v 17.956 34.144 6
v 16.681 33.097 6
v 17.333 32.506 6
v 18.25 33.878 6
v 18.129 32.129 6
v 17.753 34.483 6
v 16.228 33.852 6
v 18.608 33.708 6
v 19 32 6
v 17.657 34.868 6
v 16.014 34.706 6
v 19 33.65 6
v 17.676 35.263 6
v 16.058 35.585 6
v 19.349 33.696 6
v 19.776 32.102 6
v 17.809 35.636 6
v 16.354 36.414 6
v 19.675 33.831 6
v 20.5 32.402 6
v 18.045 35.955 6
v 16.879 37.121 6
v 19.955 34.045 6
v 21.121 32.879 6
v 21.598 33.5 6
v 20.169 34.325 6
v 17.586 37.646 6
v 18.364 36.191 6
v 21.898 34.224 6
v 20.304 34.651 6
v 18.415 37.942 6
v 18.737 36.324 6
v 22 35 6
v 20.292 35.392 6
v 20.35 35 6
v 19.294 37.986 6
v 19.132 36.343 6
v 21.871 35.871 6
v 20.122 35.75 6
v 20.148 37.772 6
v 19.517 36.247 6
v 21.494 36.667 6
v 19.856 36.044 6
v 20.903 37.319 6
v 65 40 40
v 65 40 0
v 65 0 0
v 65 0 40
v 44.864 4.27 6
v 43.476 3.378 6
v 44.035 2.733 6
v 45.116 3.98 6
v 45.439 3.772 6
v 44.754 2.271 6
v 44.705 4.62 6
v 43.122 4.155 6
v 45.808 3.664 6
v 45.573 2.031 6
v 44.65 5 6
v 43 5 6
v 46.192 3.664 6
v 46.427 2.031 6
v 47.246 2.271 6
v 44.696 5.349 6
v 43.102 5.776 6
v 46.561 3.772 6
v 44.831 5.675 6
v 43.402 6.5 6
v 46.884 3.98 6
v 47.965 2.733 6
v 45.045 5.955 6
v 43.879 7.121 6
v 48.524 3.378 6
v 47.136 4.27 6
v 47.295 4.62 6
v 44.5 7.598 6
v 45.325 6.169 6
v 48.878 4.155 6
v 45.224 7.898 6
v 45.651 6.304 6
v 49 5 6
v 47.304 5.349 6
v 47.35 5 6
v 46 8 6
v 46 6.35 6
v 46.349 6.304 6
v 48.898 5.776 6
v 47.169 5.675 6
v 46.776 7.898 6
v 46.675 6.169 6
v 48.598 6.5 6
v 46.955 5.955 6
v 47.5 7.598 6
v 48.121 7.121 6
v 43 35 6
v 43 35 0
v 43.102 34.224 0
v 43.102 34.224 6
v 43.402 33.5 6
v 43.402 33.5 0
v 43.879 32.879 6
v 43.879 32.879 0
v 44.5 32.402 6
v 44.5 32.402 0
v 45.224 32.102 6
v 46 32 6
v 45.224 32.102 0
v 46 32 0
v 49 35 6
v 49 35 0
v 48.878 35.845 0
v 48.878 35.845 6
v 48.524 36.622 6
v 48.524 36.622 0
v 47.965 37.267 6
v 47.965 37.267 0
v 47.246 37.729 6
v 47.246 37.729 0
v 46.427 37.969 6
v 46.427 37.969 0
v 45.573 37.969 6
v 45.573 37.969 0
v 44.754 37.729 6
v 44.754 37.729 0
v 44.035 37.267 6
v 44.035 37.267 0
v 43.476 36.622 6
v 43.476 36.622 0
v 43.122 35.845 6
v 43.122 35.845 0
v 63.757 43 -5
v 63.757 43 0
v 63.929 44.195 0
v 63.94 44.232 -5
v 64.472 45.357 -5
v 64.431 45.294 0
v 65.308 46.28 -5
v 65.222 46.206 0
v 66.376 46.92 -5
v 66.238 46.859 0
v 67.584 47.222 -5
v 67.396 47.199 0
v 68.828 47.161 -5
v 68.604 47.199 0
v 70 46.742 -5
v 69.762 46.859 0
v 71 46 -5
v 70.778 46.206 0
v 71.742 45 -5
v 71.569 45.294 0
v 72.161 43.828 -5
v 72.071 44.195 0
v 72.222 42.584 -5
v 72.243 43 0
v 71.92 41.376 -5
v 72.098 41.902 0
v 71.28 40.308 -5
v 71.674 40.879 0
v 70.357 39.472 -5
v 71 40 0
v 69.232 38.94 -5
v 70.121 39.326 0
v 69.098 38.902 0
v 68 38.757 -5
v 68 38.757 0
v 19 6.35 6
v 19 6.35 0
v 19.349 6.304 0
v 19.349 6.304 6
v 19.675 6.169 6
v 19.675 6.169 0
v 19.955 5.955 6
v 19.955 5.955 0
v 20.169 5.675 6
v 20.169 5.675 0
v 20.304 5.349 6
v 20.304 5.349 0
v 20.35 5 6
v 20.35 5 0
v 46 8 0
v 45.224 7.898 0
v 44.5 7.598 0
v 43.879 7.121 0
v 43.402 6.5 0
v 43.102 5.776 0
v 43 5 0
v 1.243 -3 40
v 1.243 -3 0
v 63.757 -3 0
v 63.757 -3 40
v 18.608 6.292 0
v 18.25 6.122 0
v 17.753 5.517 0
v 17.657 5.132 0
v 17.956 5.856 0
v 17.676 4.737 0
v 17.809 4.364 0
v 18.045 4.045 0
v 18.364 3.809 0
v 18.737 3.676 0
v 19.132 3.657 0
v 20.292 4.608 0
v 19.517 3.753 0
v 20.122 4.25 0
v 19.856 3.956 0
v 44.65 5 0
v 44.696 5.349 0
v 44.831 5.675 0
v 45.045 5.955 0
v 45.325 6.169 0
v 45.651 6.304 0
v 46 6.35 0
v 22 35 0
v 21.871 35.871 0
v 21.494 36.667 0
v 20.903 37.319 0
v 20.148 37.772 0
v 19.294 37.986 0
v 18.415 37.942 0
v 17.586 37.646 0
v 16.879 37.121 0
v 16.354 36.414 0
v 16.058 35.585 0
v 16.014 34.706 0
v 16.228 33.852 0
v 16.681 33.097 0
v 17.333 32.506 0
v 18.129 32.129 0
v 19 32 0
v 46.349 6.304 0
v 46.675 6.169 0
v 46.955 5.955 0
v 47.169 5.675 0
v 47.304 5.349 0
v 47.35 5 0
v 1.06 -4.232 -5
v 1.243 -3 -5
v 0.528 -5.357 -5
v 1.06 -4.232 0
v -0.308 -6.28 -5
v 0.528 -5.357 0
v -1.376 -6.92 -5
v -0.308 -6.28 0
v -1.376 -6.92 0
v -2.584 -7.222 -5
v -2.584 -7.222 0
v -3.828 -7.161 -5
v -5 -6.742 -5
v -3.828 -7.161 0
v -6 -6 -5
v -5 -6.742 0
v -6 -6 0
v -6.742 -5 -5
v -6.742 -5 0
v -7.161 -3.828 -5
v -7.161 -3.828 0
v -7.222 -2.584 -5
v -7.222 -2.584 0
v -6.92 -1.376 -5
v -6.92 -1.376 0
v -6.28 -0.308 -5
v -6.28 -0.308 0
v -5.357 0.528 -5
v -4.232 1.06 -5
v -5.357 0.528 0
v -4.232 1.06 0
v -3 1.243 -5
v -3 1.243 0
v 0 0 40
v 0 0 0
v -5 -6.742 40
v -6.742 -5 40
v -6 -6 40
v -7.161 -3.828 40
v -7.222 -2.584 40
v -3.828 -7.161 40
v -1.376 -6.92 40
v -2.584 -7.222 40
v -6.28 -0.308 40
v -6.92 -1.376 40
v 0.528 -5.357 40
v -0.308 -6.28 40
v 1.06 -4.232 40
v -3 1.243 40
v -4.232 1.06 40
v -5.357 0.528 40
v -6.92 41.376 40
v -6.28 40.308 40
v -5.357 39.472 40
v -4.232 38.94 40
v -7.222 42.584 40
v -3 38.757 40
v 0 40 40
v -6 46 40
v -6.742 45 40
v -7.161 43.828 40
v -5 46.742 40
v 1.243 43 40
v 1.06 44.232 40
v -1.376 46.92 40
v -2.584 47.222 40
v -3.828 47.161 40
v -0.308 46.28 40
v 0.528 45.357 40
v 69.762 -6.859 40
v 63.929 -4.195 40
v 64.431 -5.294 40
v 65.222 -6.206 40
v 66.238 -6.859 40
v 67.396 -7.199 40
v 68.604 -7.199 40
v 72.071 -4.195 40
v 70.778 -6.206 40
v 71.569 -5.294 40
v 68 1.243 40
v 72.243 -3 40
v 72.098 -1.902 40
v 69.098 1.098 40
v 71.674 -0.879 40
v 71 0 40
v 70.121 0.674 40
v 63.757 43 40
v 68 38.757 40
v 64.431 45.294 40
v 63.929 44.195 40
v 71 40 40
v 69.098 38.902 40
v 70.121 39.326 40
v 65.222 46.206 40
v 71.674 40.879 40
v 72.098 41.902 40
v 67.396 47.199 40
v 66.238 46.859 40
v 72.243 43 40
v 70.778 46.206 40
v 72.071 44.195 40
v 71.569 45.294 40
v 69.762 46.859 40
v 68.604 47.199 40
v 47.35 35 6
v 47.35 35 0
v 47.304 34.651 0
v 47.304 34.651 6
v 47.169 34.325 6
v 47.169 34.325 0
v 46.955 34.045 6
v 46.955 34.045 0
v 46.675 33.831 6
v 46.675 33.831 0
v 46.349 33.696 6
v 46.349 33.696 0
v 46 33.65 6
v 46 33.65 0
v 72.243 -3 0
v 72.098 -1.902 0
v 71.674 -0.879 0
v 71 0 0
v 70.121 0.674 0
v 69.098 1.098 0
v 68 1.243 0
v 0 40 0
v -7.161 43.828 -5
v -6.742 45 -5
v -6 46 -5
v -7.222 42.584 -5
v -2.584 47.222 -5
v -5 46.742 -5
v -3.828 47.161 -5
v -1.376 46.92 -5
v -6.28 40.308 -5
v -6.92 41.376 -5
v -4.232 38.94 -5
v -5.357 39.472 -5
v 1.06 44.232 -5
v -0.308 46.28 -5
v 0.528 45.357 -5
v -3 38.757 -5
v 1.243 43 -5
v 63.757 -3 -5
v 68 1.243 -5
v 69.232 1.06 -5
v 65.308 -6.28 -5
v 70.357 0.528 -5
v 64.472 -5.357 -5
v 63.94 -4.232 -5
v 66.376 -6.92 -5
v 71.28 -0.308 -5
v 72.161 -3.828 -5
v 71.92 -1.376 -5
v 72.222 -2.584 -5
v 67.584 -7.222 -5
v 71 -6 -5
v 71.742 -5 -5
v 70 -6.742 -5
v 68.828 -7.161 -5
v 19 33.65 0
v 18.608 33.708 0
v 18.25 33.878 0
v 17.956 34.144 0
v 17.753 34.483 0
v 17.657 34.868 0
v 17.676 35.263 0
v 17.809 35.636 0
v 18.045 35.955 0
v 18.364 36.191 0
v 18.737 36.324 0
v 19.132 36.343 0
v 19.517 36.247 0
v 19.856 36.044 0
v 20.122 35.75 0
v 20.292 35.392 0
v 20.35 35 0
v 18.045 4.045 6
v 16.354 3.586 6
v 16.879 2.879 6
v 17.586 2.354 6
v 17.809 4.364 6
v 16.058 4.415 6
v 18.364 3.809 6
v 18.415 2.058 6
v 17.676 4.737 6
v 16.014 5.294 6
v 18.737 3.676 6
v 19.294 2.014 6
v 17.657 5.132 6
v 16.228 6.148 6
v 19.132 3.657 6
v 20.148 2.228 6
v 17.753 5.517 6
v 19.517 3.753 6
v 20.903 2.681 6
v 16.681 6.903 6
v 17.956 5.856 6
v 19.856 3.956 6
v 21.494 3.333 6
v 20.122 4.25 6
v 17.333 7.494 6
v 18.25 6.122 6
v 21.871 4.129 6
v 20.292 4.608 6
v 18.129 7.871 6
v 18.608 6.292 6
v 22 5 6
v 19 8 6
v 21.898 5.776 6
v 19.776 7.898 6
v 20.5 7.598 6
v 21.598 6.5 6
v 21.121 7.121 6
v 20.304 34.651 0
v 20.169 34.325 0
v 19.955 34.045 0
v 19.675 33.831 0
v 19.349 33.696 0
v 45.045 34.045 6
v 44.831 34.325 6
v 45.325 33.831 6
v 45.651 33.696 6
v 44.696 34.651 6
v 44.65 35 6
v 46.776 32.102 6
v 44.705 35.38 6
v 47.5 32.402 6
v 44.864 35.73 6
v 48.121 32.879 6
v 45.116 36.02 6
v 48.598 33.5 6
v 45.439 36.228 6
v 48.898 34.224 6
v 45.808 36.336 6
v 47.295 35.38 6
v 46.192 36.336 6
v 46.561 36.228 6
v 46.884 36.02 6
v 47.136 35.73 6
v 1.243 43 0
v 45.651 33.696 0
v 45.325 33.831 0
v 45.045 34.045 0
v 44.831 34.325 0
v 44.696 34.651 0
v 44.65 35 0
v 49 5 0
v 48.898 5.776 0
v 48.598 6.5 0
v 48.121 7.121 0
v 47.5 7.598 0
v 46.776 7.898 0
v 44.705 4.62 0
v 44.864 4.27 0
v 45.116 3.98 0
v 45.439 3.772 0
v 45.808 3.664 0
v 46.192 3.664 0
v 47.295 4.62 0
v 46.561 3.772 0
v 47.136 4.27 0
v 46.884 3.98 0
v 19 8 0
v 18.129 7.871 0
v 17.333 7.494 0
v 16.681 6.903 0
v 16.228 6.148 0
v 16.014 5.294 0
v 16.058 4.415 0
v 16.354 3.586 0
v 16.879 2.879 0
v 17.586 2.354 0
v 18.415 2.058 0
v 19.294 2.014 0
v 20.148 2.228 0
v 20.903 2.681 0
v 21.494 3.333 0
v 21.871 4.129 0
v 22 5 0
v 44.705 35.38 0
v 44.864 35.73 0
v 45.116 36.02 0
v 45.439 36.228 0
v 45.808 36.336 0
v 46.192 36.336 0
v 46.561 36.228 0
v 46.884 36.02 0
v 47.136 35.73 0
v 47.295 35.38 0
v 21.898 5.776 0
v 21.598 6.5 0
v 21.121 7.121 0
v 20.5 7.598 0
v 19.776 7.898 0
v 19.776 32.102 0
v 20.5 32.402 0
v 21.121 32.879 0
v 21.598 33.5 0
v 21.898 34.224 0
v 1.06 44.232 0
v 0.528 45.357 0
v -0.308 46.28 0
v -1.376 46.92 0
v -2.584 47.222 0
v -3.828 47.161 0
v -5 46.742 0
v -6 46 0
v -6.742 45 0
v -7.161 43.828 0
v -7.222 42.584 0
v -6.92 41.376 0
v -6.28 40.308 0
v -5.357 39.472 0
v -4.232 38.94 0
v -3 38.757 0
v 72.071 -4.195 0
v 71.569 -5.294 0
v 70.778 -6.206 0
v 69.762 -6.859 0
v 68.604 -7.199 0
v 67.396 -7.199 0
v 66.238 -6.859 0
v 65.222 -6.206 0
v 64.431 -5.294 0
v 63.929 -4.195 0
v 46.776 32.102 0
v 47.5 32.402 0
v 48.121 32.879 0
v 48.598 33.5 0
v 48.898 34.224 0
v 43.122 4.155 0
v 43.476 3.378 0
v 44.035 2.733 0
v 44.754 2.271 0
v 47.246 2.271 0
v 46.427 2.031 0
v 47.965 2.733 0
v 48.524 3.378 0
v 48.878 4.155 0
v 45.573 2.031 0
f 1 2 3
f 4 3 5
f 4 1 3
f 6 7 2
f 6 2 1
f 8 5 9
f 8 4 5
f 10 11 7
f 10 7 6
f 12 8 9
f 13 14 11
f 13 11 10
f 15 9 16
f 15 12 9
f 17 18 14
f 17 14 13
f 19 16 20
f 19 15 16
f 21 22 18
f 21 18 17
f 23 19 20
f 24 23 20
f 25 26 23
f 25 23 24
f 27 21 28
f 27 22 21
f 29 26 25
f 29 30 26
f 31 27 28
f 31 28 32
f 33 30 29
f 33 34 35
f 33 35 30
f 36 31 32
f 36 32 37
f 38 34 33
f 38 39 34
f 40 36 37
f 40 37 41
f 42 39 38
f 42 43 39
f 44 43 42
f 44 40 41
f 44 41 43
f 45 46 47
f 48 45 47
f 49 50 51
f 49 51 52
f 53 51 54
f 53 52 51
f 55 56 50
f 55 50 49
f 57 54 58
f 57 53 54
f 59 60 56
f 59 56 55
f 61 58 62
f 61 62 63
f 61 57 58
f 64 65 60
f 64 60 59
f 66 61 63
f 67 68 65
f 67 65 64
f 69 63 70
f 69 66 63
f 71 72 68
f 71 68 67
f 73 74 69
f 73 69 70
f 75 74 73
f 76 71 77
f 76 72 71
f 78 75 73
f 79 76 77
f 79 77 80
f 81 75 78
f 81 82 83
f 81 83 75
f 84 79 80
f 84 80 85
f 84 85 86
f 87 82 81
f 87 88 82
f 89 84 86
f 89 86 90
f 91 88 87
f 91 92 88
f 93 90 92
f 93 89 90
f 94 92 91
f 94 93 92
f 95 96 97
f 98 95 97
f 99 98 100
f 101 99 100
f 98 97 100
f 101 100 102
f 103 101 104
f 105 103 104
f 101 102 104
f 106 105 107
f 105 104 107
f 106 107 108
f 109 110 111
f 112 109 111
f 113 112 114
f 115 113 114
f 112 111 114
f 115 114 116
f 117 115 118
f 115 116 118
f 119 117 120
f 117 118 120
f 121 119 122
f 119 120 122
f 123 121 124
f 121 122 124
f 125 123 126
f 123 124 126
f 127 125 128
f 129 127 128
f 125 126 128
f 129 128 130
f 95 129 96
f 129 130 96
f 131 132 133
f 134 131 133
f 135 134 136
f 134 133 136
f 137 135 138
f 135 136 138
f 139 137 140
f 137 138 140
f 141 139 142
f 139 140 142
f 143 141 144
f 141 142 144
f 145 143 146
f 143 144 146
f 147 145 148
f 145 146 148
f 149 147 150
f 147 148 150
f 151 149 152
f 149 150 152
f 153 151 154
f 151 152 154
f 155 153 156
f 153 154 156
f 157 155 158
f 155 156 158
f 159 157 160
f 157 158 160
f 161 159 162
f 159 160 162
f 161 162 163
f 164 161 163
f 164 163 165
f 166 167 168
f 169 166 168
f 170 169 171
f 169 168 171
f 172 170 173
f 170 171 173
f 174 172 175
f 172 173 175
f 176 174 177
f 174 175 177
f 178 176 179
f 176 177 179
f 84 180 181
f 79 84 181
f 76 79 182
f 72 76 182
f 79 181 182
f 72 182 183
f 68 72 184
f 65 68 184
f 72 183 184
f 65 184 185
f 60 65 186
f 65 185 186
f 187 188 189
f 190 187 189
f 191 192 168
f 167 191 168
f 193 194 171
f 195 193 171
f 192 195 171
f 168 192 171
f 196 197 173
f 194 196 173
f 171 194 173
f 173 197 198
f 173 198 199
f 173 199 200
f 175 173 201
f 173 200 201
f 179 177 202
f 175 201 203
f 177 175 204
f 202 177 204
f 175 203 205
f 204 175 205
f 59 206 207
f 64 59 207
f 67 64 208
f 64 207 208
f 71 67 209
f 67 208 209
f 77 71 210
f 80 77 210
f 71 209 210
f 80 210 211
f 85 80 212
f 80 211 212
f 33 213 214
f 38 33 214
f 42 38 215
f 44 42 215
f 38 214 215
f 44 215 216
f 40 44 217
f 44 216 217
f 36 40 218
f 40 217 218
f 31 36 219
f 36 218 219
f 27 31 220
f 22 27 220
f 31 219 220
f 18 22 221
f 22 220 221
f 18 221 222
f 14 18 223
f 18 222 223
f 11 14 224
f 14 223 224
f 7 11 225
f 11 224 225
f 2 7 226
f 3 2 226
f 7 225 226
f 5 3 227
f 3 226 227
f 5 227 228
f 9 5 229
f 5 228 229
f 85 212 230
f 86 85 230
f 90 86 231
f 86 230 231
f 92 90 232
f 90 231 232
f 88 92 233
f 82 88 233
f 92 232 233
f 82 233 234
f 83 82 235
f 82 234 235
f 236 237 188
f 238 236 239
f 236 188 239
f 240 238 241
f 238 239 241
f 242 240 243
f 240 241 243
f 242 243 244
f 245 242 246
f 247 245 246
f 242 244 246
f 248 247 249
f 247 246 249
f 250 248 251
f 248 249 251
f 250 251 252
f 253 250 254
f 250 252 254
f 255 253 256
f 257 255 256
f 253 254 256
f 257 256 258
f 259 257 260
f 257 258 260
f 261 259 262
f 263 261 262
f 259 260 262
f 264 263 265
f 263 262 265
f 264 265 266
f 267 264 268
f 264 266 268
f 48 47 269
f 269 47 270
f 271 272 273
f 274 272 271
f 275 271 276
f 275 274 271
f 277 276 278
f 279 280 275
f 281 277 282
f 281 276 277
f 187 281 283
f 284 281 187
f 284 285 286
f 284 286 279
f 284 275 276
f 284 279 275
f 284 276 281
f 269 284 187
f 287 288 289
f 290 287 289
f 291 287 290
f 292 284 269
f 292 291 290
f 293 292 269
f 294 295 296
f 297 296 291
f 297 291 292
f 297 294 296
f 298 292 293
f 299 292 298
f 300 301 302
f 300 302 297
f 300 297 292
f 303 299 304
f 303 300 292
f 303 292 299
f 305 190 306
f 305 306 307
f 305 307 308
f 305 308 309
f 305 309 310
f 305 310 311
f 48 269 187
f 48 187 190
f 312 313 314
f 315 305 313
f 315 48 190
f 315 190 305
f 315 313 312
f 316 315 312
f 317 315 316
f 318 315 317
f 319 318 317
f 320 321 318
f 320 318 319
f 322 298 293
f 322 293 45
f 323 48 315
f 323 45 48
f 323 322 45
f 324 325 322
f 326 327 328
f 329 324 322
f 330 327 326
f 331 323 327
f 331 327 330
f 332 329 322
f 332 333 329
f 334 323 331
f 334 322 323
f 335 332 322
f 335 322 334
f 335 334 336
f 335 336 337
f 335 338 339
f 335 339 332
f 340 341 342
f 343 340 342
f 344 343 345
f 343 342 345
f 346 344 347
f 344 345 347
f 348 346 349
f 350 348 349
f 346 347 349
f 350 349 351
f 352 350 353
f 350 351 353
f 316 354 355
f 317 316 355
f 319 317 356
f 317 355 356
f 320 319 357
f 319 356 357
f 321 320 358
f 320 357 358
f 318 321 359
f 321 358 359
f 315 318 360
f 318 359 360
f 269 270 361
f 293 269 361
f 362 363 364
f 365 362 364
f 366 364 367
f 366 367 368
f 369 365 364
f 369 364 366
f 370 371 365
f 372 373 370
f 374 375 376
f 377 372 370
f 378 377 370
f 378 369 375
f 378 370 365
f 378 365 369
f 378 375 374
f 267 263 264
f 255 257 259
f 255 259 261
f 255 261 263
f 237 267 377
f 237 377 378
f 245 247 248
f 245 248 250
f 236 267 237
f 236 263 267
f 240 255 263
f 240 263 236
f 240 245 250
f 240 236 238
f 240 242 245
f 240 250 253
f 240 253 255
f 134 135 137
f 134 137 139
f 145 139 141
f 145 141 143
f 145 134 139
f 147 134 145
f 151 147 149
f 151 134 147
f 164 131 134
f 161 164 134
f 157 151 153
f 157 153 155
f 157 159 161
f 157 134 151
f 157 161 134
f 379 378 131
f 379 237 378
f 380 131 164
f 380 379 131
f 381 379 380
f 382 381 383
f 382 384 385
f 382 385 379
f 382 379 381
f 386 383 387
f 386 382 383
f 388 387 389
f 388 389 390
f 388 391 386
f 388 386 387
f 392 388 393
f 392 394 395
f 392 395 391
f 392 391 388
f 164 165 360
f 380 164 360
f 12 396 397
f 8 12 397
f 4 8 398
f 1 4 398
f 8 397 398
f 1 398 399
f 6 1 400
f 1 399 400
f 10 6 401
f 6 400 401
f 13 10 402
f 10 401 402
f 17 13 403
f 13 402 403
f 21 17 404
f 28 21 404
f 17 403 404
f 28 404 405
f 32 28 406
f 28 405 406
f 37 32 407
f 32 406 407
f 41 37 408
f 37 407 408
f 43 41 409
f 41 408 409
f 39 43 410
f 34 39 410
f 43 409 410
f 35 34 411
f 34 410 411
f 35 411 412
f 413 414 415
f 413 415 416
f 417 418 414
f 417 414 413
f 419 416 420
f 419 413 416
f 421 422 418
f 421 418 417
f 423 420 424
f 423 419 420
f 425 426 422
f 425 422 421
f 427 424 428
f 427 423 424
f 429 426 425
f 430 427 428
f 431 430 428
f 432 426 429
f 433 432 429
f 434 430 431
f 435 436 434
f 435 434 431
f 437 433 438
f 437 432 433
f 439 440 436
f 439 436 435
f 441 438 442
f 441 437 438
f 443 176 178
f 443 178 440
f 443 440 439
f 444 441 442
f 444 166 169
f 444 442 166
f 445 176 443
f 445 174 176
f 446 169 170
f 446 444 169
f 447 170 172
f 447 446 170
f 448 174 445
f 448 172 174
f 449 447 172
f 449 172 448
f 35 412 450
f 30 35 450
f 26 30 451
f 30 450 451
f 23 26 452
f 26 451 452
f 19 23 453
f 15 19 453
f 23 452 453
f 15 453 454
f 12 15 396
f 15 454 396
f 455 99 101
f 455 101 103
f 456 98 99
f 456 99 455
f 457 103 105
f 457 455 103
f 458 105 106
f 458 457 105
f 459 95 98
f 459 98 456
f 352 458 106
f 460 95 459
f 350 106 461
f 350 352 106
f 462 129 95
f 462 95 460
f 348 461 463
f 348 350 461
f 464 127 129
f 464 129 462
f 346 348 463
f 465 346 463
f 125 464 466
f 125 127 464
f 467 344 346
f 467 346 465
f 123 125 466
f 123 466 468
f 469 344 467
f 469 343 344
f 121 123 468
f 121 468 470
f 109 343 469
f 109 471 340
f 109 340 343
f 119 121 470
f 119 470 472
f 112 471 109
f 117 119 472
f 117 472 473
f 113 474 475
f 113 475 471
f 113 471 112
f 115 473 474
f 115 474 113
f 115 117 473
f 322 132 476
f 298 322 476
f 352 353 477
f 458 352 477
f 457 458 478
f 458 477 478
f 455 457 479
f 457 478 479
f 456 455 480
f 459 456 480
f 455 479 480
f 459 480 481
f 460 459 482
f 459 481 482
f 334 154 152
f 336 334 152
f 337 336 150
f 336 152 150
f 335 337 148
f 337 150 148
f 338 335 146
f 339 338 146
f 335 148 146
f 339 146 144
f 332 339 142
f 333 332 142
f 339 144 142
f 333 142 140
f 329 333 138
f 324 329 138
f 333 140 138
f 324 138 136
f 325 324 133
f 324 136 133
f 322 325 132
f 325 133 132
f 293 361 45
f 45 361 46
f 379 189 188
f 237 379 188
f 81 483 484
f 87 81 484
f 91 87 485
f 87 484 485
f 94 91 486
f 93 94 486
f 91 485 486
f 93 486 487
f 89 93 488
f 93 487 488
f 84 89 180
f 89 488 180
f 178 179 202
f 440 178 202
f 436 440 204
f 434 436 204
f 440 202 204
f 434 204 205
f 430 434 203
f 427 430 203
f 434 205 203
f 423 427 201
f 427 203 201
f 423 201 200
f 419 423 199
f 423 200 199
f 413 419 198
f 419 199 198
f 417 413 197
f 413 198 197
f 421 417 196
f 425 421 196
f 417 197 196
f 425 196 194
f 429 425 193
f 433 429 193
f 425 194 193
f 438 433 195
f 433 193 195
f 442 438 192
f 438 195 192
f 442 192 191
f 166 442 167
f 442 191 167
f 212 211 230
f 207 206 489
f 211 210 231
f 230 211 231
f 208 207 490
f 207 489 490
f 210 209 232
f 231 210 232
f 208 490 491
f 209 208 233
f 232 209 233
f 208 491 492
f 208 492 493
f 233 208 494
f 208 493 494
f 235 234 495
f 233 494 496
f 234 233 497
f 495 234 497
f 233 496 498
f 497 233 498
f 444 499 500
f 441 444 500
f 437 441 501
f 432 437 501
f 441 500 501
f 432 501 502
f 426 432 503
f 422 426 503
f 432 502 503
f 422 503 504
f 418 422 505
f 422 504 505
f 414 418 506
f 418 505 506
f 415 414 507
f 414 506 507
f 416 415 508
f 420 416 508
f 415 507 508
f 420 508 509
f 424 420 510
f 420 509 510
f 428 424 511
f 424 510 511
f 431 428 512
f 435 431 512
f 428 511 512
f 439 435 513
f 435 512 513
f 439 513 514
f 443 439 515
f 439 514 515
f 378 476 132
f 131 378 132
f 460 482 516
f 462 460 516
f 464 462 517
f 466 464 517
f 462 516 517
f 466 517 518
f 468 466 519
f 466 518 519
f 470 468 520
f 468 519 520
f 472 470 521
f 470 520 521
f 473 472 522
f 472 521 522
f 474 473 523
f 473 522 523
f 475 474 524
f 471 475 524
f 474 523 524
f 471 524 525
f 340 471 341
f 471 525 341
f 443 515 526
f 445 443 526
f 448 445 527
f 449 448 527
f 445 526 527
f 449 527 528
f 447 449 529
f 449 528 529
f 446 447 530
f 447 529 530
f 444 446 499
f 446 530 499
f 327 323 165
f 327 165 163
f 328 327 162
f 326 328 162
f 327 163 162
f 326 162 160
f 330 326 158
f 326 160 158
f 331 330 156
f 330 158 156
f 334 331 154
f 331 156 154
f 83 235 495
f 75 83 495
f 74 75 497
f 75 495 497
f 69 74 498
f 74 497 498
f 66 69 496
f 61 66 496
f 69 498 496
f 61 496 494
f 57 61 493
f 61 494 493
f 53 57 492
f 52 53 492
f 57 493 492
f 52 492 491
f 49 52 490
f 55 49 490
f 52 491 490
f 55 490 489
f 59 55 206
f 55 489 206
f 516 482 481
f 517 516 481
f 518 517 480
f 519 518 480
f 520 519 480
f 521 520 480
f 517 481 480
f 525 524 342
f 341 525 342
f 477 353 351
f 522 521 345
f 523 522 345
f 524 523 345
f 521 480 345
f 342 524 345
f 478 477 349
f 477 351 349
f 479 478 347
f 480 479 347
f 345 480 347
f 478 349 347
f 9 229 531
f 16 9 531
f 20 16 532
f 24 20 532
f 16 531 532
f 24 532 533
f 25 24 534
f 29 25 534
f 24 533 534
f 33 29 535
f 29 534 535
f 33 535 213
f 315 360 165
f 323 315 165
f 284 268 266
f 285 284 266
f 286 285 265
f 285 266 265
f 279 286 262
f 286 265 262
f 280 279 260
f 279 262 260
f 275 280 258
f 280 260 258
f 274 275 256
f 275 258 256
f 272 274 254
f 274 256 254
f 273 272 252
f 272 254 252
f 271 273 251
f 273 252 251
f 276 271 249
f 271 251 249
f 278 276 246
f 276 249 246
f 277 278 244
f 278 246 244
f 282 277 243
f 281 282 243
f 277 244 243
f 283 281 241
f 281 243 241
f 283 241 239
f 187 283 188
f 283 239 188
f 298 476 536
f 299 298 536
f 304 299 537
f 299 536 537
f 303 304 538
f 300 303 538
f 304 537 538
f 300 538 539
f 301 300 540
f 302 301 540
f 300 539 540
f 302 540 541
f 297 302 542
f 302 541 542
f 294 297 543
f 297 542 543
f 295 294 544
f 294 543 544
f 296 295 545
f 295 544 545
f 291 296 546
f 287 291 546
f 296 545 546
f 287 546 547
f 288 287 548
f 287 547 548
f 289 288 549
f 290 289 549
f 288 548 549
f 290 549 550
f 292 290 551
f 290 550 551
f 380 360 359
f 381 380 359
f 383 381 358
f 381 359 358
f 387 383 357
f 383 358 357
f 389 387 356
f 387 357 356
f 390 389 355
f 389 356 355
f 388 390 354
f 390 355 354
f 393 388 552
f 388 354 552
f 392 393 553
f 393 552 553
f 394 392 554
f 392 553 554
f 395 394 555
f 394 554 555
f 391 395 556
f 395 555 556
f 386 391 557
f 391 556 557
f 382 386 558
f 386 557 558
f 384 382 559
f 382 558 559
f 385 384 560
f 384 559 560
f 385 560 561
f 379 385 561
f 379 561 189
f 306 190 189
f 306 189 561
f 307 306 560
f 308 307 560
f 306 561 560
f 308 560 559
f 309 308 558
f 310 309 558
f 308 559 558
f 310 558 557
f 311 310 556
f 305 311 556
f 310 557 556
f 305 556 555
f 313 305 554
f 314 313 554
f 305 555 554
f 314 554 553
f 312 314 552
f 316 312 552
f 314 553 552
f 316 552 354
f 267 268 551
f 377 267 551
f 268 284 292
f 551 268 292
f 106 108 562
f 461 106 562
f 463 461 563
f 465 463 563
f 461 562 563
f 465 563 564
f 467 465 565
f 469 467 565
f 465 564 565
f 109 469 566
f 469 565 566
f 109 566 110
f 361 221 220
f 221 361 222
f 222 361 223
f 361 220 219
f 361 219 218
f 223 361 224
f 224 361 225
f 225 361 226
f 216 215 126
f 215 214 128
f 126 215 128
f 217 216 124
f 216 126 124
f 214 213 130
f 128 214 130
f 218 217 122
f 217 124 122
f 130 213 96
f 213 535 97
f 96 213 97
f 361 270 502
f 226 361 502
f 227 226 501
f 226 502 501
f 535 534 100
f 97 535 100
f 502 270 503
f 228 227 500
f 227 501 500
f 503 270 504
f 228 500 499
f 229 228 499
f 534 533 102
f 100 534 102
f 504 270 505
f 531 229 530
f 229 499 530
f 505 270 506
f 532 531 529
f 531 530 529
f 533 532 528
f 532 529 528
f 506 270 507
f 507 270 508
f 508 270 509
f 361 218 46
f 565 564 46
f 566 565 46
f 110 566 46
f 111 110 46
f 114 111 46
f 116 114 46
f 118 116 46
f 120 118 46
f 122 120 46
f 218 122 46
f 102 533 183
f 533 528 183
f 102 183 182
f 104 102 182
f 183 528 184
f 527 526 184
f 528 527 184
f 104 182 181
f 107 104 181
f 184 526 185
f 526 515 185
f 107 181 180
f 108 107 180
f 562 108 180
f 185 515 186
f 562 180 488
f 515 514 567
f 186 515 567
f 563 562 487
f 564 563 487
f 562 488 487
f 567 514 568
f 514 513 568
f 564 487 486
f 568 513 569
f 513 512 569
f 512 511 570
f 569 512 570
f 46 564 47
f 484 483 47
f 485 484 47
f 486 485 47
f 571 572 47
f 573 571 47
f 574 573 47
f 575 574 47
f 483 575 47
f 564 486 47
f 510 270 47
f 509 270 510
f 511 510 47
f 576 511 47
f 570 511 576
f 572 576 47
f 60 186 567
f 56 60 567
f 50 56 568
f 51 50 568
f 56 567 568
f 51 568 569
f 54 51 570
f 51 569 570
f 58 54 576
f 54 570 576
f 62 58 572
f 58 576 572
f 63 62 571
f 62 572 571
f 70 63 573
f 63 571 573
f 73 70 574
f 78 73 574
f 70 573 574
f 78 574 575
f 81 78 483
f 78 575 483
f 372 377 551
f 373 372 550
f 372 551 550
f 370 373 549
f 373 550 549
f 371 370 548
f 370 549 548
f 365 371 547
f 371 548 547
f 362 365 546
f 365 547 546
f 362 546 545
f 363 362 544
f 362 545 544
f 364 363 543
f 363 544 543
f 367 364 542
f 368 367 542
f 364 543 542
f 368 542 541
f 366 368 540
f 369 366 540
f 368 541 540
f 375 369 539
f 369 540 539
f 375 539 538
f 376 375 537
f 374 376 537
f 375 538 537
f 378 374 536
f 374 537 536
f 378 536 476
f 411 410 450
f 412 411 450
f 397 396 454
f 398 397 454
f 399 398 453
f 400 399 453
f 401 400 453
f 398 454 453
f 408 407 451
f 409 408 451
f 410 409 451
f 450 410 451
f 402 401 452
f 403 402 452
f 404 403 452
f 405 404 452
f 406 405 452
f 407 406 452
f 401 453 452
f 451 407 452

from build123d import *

# Parameters (mm, degrees)
F1_DEPTH = 40
F2_W     = 65
F2_H     = 40
F3_DEPTH = 5
F5_DEPTH = 6


with BuildPart() as f1:
    # F0 (on Top) → F1 (new body)
    with BuildSketch(Plane.XY):
        with BuildLine():
            Line((-3, 43), (1.2426406871, 43))
            ThreePointArc((1.2426406871, 43), (-6, 46), (-3, 38.7573593129))
            Line((-3, 38.7573593129), (-3, 43))
        make_face()
        with BuildLine():
            ThreePointArc((-3, 38.7573593129), (-1.3764116996, 39.0803111054), (0, 40))
            ThreePointArc((0, 40), (0.9196888946, 41.3764116996), (1.2426406871, 43))
            Line((1.2426406871, 43), (-3, 43))
            Line((-3, 43), (-3, 38.7573593129))
        make_face()
        with BuildLine():
            ThreePointArc((-3, 1.2426406871), (-1.3764116996, 0.9196888946), (0, 0))
            Line((0, 0), (0, 40))
            ThreePointArc((0, 40), (-1.3764116996, 39.0803111054), (-3, 38.7573593129))
            Line((-3, 38.7573593129), (-3, 1.2426406871))
        make_face()
        with BuildLine():
            ThreePointArc((1.2426406871, 43), (0.9196888946, 41.3764116996), (0, 40))
            Line((0, 40), (65, 40))
            ThreePointArc((65, 40), (64.0803111054, 41.3764116996), (63.7573593129, 43))
            Line((63.7573593129, 43), (1.2426406871, 43))
        make_face()
        with BuildLine():
            ThreePointArc((72.2426406871, 43), (68, 47.2426406871), (63.7573593129, 43))
            Line((63.7573593129, 43), (68, 43))
            Line((68, 43), (68, 38.7573593129))
            ThreePointArc((68, 38.7573593129), (71, 40), (72.2426406871, 43))
        make_face()
        with BuildLine():
            ThreePointArc((63.7573593129, 43), (64.0803111054, 41.3764116996), (65, 40))
            ThreePointArc((65, 40), (66.3764116996, 39.0803111054), (68, 38.7573593129))
            Line((68, 38.7573593129), (68, 43))
            Line((68, 43), (63.7573593129, 43))
        make_face()
        with BuildLine():
            ThreePointArc((72.2426406871, -3), (71, 0), (68, 1.2426406871))
            Line((68, 1.2426406871), (68, -3))
            Line((68, -3), (63.7573593129, -3))
            ThreePointArc((63.7573593129, -3), (68, -7.2426406871), (72.2426406871, -3))
        make_face()
        with BuildLine():
            ThreePointArc((68, 1.2426406871), (66.3764116996, 0.9196888946), (65, 0))
            ThreePointArc((65, 0), (64.0803111054, -1.3764116996), (63.7573593129, -3))
            Line((63.7573593129, -3), (68, -3))
            Line((68, -3), (68, 1.2426406871))
        make_face()
        with BuildLine():
            ThreePointArc((-3, 1.2426406871), (-6, -6), (1.2426406871, -3))
            Line((1.2426406871, -3), (-3, -3))
            Line((-3, -3), (-3, 1.2426406871))
        make_face()
        with BuildLine():
            ThreePointArc((1.2426406871, -3), (0.9196888946, -1.3764116996), (0, 0))
            ThreePointArc((0, 0), (-1.3764116996, 0.9196888946), (-3, 1.2426406871))
            Line((-3, 1.2426406871), (-3, -3))
            Line((-3, -3), (1.2426406871, -3))
        make_face()
        with BuildLine():
            Line((65, 0), (0, 0))
            ThreePointArc((0, 0), (0.9196888946, -1.3764116996), (1.2426406871, -3))
            Line((1.2426406871, -3), (63.7573593129, -3))
            ThreePointArc((63.7573593129, -3), (64.0803111054, -1.3764116996), (65, 0))
        make_face()
        with BuildLine():
            Line((65, 40), (65, 0))
            ThreePointArc((65, 0), (66.3764116996, 0.9196888946), (68, 1.2426406871))
            Line((68, 1.2426406871), (68, 38.7573593129))
            ThreePointArc((68, 38.7573593129), (66.3764116996, 39.0803111054), (65, 40))
        make_face()
    extrude(amount=F1_DEPTH)

    # F2 (on face) → F3 (join)
    with BuildSketch(Plane(origin=(0, 0, 0), x_dir=(1, 0, 0), z_dir=(0, 0, -1))):
        with BuildLine():
            Line((-3, -1.2426406871), (-3, -38.7573593129))
            ThreePointArc((-3, -38.7573593129), (-6, -46), (1.2426406871, -43))
            Line((1.2426406871, -43), (63.7573593129, -43))
            ThreePointArc((63.7573593129, -43), (71, -46), (68, -38.7573593129))
            Line((68, -38.7573593129), (68, -1.2426406871))
            ThreePointArc((68, -1.2426406871), (71, 6), (63.7573593129, 3))
            Line((63.7573593129, 3), (1.2426406871, 3))
            ThreePointArc((1.2426406871, 3), (-6, 6), (-3, -1.2426406871))
        make_face()
        with Locations((32.5, -20)):
            Rectangle(F2_W, F2_H, mode=Mode.SUBTRACT)
        with Locations((32.5, -20)):
            Rectangle(F2_W, F2_H)
    extrude(amount=F3_DEPTH)

    # F4 (on face) → F5 (join)
    with BuildSketch(Plane.XY):
        with BuildLine():
            ThreePointArc((22, 35), (16.8786796564, 37.1213203436), (19, 32))
            Line((19, 32), (19, 33.65))
            ThreePointArc((19, 33.65), (18.0454058454, 35.9545941546), (20.35, 35))
            Line((20.35, 35), (22, 35))
        make_face()
        with BuildLine():
            Line((19, 33.65), (19, 32))
            ThreePointArc((19, 32), (21.1213203436, 32.8786796564), (22, 35))
            Line((22, 35), (20.35, 35))
            ThreePointArc((20.35, 35), (19.9545941546, 34.0454058454), (19, 33.65))
        make_face()
        with BuildLine():
            Line((46, 33.65), (46, 32))
            ThreePointArc((46, 32), (48.1213203436, 32.8786796564), (49, 35))
            ThreePointArc((49, 35), (46, 38), (43, 35))
            Line((43, 35), (44.65, 35))
            ThreePointArc((44.65, 35), (46, 36.35), (47.35, 35))
            ThreePointArc((47.35, 35), (46.9545941546, 34.0454058454), (46, 33.65))
        make_face()
        with BuildLine():
            ThreePointArc((43, 35), (43.8786796564, 32.8786796564), (46, 32))
            Line((46, 32), (46, 33.65))
            ThreePointArc((46, 33.65), (45.0454058454, 34.0454058454), (44.65, 35))
            Line((44.65, 35), (43, 35))
        make_face()
        with BuildLine():
            ThreePointArc((19, 6.35), (19.9545941546, 5.9545941546), (20.35, 5))
            Line((20.35, 5), (22, 5))
            ThreePointArc((22, 5), (21.1213203436, 7.1213203436), (19, 8))
            Line((19, 8), (19, 6.35))
        make_face()
        with BuildLine():
            Line((22, 5), (20.35, 5))
            ThreePointArc((20.35, 5), (18.0454058454, 4.0454058454), (19, 6.35))
            Line((19, 6.35), (19, 8))
            ThreePointArc((19, 8), (16.8786796564, 2.8786796564), (22, 5))
        make_face()
        with BuildLine():
            ThreePointArc((46, 8), (43.8786796564, 7.1213203436), (43, 5))
            Line((43, 5), (44.65, 5))
            ThreePointArc((44.65, 5), (45.0454058454, 5.9545941546), (46, 6.35))
            Line((46, 6.35), (46, 8))
        make_face()
        with BuildLine():
            Line((44.65, 5), (43, 5))
            ThreePointArc((43, 5), (46, 2), (49, 5))
            ThreePointArc((49, 5), (48.1213203436, 7.1213203436), (46, 8))
            Line((46, 8), (46, 6.35))
            ThreePointArc((46, 6.35), (46.9545941546, 5.9545941546), (47.35, 5))
            ThreePointArc((47.35, 5), (46, 3.65), (44.65, 5))
        make_face()
    extrude(amount=F5_DEPTH)


solid = f1.part
